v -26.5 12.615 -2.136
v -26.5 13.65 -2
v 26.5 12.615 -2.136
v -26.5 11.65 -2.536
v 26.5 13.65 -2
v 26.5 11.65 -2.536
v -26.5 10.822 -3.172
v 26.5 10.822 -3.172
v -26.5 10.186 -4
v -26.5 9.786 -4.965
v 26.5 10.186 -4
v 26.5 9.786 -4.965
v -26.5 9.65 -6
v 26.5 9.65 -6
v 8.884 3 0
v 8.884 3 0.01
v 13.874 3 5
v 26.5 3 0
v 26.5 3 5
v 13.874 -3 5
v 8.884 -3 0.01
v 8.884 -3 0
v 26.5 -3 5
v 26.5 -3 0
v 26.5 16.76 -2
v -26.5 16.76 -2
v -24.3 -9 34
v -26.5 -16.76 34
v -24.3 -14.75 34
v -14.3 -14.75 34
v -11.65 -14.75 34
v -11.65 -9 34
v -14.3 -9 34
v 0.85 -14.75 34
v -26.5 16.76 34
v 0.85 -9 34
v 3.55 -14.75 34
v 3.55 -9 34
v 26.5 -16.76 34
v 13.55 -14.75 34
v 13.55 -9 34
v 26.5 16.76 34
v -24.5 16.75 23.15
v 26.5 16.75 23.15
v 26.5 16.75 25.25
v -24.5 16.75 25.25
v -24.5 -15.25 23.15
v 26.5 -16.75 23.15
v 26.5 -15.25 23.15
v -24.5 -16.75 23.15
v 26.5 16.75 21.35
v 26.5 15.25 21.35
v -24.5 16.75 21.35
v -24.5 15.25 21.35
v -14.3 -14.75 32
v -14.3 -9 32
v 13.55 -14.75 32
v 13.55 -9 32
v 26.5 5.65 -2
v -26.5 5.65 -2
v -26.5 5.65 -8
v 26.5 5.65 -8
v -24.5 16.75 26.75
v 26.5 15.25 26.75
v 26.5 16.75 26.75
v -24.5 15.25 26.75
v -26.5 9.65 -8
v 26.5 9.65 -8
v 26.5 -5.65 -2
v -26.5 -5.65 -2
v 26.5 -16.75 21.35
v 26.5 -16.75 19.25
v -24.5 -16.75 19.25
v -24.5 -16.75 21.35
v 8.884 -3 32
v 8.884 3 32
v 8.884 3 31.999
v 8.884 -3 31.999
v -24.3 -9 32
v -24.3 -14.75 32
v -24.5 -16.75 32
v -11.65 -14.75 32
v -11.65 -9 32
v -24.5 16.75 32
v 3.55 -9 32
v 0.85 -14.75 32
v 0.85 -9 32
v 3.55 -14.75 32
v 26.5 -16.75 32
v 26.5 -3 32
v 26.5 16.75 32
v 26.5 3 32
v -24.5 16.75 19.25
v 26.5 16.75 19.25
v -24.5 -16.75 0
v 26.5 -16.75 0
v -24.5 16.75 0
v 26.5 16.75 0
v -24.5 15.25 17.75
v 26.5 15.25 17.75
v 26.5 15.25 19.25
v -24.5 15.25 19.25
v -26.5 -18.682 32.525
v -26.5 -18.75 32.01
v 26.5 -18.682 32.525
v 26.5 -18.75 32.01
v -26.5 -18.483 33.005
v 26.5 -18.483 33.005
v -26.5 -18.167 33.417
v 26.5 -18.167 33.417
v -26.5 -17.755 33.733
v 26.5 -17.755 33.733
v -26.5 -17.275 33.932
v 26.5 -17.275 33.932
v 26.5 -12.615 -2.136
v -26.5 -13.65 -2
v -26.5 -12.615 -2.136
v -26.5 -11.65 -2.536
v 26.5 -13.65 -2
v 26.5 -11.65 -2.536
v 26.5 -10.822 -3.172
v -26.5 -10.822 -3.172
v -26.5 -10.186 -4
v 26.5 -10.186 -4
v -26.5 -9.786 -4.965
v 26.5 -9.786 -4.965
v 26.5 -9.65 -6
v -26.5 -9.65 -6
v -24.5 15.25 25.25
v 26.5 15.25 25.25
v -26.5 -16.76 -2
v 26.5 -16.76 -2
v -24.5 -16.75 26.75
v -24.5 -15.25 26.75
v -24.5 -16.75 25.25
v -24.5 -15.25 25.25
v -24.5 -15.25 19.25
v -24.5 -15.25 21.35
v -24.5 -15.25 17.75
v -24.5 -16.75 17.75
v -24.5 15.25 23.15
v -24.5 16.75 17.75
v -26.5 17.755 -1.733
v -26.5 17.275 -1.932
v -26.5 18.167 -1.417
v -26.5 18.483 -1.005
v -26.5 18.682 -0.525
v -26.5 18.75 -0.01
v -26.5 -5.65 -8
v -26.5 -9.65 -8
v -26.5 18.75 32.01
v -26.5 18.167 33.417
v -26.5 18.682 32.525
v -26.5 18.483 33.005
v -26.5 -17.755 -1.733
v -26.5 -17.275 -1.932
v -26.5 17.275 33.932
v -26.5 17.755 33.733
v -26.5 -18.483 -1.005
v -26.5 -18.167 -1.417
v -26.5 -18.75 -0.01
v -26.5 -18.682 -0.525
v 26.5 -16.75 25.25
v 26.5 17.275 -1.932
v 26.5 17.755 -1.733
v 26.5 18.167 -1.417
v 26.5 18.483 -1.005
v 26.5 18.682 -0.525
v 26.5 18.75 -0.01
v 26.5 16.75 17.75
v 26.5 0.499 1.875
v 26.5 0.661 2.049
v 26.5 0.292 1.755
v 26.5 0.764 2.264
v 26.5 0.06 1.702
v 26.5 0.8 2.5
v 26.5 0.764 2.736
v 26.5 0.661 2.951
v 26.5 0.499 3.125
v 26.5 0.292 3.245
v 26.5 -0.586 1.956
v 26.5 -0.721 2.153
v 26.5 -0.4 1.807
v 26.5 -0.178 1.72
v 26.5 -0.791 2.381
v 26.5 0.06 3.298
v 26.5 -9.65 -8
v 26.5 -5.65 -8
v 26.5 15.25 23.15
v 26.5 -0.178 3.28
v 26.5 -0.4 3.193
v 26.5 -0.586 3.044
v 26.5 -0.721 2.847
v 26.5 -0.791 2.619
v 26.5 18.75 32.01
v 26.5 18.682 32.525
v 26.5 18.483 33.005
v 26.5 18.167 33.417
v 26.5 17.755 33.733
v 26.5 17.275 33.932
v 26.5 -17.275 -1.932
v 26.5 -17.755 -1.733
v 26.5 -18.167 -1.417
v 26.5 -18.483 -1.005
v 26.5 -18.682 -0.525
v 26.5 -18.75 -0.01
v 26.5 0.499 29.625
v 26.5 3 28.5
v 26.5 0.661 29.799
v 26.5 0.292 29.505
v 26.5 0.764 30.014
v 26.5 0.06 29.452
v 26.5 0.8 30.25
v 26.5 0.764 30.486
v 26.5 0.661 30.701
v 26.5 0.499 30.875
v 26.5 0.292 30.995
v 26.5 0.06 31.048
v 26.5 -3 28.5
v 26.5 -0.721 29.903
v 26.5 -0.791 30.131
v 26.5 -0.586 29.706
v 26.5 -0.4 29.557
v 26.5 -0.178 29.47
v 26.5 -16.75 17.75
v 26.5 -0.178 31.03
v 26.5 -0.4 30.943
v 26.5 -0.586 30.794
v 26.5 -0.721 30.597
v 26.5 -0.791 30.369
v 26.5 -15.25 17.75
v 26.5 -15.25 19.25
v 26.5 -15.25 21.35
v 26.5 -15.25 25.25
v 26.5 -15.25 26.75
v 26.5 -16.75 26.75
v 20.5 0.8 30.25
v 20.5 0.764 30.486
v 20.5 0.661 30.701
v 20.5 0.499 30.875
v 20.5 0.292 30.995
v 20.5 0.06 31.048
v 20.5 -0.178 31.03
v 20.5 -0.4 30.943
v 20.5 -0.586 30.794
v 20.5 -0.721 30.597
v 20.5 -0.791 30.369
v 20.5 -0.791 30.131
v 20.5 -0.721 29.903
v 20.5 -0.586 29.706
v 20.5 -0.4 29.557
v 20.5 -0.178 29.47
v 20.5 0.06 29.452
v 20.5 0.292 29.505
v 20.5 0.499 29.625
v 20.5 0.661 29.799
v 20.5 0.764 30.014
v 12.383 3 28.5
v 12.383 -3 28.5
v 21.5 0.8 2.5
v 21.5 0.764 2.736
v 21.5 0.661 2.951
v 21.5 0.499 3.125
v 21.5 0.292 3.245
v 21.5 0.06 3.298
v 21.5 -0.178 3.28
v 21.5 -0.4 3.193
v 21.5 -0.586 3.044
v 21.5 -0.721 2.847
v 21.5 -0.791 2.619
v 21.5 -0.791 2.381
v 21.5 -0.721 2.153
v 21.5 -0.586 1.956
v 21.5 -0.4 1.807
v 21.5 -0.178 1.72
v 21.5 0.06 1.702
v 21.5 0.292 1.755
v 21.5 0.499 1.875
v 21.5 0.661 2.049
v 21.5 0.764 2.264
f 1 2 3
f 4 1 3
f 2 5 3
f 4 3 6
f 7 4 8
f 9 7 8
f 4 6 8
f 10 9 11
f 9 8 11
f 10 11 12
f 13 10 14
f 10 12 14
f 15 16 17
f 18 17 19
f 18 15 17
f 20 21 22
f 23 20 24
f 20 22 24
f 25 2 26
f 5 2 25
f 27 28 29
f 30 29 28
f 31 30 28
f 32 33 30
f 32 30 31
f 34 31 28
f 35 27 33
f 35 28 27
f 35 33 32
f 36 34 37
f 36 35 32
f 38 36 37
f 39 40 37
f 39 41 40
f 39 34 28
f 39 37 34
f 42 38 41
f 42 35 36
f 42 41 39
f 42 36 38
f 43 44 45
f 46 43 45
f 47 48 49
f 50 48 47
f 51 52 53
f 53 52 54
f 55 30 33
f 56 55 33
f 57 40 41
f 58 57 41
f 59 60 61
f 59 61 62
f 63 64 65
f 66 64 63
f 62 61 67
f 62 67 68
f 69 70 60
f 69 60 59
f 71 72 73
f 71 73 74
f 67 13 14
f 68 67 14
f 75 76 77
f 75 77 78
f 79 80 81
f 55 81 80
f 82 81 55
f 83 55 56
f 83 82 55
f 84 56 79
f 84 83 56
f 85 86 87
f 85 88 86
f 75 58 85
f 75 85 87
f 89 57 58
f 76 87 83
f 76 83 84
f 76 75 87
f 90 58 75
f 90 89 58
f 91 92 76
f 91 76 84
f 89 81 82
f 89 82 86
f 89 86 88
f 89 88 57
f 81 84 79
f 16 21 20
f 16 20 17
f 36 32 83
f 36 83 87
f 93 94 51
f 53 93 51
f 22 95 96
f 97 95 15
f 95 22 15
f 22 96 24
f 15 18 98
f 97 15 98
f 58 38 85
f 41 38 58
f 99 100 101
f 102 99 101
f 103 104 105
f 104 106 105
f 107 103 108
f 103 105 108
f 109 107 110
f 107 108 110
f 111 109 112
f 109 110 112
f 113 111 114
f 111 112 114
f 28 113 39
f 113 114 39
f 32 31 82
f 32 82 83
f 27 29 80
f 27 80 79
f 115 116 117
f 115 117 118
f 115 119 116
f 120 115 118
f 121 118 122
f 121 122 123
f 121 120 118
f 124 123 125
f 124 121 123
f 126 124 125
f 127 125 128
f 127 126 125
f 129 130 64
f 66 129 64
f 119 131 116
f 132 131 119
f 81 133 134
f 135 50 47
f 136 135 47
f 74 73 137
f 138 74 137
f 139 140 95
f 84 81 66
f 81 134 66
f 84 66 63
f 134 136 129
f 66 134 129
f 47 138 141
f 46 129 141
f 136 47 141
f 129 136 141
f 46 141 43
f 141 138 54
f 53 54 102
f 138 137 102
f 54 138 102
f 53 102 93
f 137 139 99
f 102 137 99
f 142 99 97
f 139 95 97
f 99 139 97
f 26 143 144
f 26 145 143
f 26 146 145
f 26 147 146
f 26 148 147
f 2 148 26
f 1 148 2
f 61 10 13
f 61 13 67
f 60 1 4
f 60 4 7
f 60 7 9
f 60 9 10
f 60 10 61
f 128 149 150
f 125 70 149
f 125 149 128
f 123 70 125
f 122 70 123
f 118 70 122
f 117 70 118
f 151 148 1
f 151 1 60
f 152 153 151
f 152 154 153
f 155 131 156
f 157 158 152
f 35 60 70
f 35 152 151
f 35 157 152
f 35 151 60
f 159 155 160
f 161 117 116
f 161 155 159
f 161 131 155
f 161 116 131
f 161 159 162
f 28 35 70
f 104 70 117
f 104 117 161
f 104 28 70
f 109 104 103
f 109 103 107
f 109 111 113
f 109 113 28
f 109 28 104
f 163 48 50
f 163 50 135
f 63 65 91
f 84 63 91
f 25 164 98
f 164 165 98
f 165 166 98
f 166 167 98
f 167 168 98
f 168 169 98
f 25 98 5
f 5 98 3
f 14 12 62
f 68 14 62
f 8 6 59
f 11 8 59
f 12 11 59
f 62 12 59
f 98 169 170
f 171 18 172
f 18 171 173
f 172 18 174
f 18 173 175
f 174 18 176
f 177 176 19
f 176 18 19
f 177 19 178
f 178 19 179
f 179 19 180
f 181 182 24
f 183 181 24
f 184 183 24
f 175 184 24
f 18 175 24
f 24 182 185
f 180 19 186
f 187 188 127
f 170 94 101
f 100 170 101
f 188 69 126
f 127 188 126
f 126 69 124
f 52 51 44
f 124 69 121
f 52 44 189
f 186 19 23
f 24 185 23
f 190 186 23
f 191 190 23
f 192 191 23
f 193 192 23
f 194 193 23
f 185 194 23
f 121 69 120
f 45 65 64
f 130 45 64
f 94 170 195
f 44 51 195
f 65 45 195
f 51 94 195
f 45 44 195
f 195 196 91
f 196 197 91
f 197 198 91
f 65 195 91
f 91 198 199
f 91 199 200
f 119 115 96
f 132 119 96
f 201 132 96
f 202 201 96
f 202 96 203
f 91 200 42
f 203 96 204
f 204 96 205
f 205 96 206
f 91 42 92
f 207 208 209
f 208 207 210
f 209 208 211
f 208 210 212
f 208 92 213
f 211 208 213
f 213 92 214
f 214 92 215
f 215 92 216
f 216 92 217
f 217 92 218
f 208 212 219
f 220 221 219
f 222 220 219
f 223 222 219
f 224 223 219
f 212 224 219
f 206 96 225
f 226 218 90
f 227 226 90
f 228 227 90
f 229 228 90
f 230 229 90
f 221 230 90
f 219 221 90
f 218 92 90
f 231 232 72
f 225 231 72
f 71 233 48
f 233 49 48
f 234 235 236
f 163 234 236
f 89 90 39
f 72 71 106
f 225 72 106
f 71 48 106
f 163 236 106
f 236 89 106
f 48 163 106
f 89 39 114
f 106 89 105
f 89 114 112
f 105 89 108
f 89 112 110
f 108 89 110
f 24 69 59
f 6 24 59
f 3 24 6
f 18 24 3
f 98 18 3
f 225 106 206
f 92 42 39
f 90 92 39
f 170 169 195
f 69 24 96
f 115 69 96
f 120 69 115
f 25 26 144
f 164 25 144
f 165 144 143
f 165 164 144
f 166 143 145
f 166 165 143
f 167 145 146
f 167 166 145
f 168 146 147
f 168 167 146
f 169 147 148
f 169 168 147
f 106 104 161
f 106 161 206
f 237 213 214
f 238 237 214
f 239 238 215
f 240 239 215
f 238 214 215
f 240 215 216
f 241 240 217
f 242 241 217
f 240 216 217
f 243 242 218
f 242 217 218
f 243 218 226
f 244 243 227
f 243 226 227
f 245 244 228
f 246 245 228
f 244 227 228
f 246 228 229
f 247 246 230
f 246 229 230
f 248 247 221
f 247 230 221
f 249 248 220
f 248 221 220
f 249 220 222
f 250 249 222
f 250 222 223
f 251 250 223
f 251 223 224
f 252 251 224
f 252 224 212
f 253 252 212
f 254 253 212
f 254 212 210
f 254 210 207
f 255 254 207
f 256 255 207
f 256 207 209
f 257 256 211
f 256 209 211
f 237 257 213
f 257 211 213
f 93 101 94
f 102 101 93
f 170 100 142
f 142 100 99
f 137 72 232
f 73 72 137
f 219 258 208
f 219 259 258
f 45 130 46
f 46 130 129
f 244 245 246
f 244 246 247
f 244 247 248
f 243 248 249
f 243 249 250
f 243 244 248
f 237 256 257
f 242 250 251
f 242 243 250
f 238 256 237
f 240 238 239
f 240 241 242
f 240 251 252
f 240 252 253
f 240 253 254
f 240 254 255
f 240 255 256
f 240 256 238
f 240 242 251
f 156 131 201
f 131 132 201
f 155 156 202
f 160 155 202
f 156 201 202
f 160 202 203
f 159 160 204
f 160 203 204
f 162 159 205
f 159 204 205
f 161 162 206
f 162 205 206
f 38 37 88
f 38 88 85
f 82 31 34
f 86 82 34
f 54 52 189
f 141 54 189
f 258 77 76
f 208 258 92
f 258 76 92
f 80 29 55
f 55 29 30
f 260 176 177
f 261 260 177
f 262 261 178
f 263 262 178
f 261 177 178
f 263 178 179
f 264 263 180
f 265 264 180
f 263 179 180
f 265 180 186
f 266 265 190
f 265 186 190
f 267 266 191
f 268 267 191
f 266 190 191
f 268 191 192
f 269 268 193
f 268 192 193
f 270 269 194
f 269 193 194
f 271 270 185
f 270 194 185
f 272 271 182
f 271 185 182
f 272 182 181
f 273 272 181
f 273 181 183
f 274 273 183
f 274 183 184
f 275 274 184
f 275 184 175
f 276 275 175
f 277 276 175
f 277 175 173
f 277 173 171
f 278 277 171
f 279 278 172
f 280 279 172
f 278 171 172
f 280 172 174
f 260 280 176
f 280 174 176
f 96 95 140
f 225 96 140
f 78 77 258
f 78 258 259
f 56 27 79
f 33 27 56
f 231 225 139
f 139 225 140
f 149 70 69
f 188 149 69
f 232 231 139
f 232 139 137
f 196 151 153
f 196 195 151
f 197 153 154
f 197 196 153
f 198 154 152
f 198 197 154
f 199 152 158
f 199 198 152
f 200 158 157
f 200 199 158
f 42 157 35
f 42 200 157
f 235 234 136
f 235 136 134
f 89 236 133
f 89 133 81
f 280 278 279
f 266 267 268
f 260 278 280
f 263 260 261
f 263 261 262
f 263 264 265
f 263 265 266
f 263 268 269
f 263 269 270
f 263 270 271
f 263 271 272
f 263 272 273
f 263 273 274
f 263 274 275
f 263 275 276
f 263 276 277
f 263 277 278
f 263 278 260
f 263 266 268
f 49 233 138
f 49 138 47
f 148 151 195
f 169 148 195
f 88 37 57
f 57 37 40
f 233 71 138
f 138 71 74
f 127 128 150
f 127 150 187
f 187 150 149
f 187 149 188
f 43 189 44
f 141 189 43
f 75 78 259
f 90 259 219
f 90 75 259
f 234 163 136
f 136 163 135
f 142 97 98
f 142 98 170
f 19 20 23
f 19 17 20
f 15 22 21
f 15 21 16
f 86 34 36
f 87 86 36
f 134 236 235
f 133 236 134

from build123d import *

# Parameters (mm, degrees)
SKETCH_W        = 53
SKETCH_H        = 37.5
SKETCH_W_2      = 49
SKETCH_H_2      = 33.5
PAD_DEPTH       = 32
SKETCH001_W     = 53
SKETCH001_H     = 37.5
PAD001_DEPTH    = 2
SKETCH002_W     = 53
SKETCH002_H     = 37.5
PAD002_DEPTH    = 2
SKETCH003_W     = 33.5
SKETCH003_H     = 32
POCKET_DEPTH    = 2
SKETCH004_W     = 10
SKETCH004_H     = 5.75
SKETCH004_W_2   = 12.5
POCKET001_DEPTH = 5
SKETCH005_W     = 51
SKETCH005_H     = 1.8
SKETCH005_H_2   = 1.5
PAD003_DEPTH    = 33.5
SKETCH006_W     = 30.5
SKETCH006_H     = 9
POCKET002_DEPTH = 51
SKETCH007_W     = 17.616245
SKETCH007_H     = 6
PAD004_DEPTH    = 5
SKETCH008_R     = 0.8
POCKET003_DEPTH = 5
SKETCH009_W     = 17.616245
SKETCH009_H     = 6
PAD005_DEPTH    = 3.5
SKETCH010_R     = 0.8
POCKET004_DEPTH = 6
CHAMFER_SIZE    = 3.499
CHAMFER001_SIZE = 4.99
FILLET_R        = 1.99
SKETCH011_W     = 53
SKETCH011_H     = 4
PAD006_DEPTH    = 6
FILLET001_R     = 4


with BuildPart() as part:
    # Sketch → Pad (new body)
    with BuildSketch(Plane.XY):
        Rectangle(SKETCH_W, SKETCH_H)
        Rectangle(SKETCH_W_2, SKETCH_H_2, mode=Mode.SUBTRACT)
    extrude(amount=PAD_DEPTH)

    # Sketch001 (on Face10 of Pad) → Pad001 (join)
    with BuildSketch(Plane.XY.offset(32)):
        Rectangle(SKETCH001_W, SKETCH001_H)
    extrude(amount=PAD001_DEPTH)

    # Sketch002 (on Face4 of Pad001) → Pad002 (join)
    with BuildSketch(Plane(origin=(0, 0, 0), x_dir=(1, 0, 0), z_dir=(0, 0, -1))):
        Rectangle(SKETCH002_W, SKETCH002_H)
    extrude(amount=PAD002_DEPTH)

    # Sketch003 (on Face3 of Pad002) → Pocket (cut)
    with BuildSketch(Plane.YZ.offset(26.5)):
        with Locations((0, 16)):
            Rectangle(SKETCH003_W, SKETCH003_H)
    extrude(amount=-POCKET_DEPTH, mode=Mode.SUBTRACT)

    # Sketch004 (on Face13 of Pocket) → Pocket001 (cut)
    with BuildSketch(Plane.XY.offset(34)):
        with Locations((-19.3, -11.875)):
            Rectangle(SKETCH004_W, SKETCH004_H)
        with Locations((-5.4, -11.875)):
            Rectangle(SKETCH004_W_2, SKETCH004_H)
        with Locations((8.55, -11.875)):
            Rectangle(SKETCH004_W, SKETCH004_H)
    extrude(amount=-POCKET001_DEPTH, mode=Mode.SUBTRACT)

    # Sketch005 (on Face36 of Pocket001) → Pad003 (join)
    with BuildSketch(Plane(origin=(0, -16.75, 0), x_dir=(-1, 0, 0), z_dir=(0, 1, 0))):
        with Locations((-1, 22.25)):
            Rectangle(SKETCH005_W, SKETCH005_H)
        with Locations((-1, 26)):
            Rectangle(SKETCH005_W, SKETCH005_H_2)
        with Locations((-1, 18.5)):
            Rectangle(SKETCH005_W, SKETCH005_H_2)
    extrude(amount=PAD003_DEPTH)

    # Sketch006 (on Face11 of Pad003) → Pocket002 (cut)
    with BuildSketch(Plane.YZ.offset(26.5)):
        with Locations((0, 22.25)):
            Rectangle(SKETCH006_W, SKETCH006_H)
    extrude(amount=-POCKET002_DEPTH, mode=Mode.SUBTRACT)

    # Sketch007 (on Face57 of Pocket002) → Pad004 (join)
    with BuildSketch(Plane.XY):
        with Locations((17.6918775, 0)):
            Rectangle(SKETCH007_W, SKETCH007_H)
    extrude(amount=PAD004_DEPTH)

    # Sketch008 (on Face24 of Pad004) → Pocket003 (cut)
    with BuildSketch(Plane.YZ.offset(26.5)):
        with Locations((0, 2.5)):
            Circle(SKETCH008_R)
    extrude(amount=-POCKET003_DEPTH, mode=Mode.SUBTRACT)

    # Sketch009 (on Face65 of Pocket003) → Pad005 (join)
    with BuildSketch(Plane(origin=(0, 0, 32), x_dir=(1, 0, 0), z_dir=(0, 0, -1))):
        with Locations((17.6918775, 0)):
            Rectangle(SKETCH009_W, SKETCH009_H)
    extrude(amount=PAD005_DEPTH)

    # Sketch010 (on Face41 of Pad005) → Pocket004 (cut)
    with BuildSketch(Plane.YZ.offset(26.5)):
        with Locations((0, 30.25)):
            Circle(SKETCH010_R)
    extrude(amount=-POCKET004_DEPTH, mode=Mode.SUBTRACT)

    # Chamfer
    chamfer_edges = [part.edges().sort_by_distance(p)[0] for p in [
        (8.883755, 0, 28.5),
    ]]
    chamfer(chamfer_edges, length=CHAMFER_SIZE)

    # Chamfer001
    chamfer001_edges = [part.edges().sort_by_distance(p)[0] for p in [
        (8.883755, 0, 5),
    ]]
    chamfer(chamfer001_edges, length=CHAMFER001_SIZE)

    # Fillet
    fillet_edges = [part.edges().sort_by_distance(p)[0] for p in [
        (0, -18.75, 34),
        (0, 18.75, 34),
        (0, 18.75, -2),
        (0, -18.75, -2),
    ]]
    fillet(fillet_edges, radius=FILLET_R)

    # Sketch011 (on Face5 of Fillet) → Pad006 (join)
    with BuildSketch(Plane(origin=(0, 0, -2), x_dir=(1, 0, 0), z_dir=(0, 0, -1))):
        with Locations((0, 7.65)):
            Rectangle(SKETCH011_W, SKETCH011_H)
        with Locations((0, -7.65)):
            Rectangle(SKETCH011_W, SKETCH011_H)
    extrude(amount=PAD006_DEPTH)

    # Fillet001
    fillet001_edges = [part.edges().sort_by_distance(p)[0] for p in [
        (0, 9.65, -2),
        (0, -9.65, -2),
    ]]
    fillet(fillet001_edges, radius=FILLET001_R)


solid = part.part
